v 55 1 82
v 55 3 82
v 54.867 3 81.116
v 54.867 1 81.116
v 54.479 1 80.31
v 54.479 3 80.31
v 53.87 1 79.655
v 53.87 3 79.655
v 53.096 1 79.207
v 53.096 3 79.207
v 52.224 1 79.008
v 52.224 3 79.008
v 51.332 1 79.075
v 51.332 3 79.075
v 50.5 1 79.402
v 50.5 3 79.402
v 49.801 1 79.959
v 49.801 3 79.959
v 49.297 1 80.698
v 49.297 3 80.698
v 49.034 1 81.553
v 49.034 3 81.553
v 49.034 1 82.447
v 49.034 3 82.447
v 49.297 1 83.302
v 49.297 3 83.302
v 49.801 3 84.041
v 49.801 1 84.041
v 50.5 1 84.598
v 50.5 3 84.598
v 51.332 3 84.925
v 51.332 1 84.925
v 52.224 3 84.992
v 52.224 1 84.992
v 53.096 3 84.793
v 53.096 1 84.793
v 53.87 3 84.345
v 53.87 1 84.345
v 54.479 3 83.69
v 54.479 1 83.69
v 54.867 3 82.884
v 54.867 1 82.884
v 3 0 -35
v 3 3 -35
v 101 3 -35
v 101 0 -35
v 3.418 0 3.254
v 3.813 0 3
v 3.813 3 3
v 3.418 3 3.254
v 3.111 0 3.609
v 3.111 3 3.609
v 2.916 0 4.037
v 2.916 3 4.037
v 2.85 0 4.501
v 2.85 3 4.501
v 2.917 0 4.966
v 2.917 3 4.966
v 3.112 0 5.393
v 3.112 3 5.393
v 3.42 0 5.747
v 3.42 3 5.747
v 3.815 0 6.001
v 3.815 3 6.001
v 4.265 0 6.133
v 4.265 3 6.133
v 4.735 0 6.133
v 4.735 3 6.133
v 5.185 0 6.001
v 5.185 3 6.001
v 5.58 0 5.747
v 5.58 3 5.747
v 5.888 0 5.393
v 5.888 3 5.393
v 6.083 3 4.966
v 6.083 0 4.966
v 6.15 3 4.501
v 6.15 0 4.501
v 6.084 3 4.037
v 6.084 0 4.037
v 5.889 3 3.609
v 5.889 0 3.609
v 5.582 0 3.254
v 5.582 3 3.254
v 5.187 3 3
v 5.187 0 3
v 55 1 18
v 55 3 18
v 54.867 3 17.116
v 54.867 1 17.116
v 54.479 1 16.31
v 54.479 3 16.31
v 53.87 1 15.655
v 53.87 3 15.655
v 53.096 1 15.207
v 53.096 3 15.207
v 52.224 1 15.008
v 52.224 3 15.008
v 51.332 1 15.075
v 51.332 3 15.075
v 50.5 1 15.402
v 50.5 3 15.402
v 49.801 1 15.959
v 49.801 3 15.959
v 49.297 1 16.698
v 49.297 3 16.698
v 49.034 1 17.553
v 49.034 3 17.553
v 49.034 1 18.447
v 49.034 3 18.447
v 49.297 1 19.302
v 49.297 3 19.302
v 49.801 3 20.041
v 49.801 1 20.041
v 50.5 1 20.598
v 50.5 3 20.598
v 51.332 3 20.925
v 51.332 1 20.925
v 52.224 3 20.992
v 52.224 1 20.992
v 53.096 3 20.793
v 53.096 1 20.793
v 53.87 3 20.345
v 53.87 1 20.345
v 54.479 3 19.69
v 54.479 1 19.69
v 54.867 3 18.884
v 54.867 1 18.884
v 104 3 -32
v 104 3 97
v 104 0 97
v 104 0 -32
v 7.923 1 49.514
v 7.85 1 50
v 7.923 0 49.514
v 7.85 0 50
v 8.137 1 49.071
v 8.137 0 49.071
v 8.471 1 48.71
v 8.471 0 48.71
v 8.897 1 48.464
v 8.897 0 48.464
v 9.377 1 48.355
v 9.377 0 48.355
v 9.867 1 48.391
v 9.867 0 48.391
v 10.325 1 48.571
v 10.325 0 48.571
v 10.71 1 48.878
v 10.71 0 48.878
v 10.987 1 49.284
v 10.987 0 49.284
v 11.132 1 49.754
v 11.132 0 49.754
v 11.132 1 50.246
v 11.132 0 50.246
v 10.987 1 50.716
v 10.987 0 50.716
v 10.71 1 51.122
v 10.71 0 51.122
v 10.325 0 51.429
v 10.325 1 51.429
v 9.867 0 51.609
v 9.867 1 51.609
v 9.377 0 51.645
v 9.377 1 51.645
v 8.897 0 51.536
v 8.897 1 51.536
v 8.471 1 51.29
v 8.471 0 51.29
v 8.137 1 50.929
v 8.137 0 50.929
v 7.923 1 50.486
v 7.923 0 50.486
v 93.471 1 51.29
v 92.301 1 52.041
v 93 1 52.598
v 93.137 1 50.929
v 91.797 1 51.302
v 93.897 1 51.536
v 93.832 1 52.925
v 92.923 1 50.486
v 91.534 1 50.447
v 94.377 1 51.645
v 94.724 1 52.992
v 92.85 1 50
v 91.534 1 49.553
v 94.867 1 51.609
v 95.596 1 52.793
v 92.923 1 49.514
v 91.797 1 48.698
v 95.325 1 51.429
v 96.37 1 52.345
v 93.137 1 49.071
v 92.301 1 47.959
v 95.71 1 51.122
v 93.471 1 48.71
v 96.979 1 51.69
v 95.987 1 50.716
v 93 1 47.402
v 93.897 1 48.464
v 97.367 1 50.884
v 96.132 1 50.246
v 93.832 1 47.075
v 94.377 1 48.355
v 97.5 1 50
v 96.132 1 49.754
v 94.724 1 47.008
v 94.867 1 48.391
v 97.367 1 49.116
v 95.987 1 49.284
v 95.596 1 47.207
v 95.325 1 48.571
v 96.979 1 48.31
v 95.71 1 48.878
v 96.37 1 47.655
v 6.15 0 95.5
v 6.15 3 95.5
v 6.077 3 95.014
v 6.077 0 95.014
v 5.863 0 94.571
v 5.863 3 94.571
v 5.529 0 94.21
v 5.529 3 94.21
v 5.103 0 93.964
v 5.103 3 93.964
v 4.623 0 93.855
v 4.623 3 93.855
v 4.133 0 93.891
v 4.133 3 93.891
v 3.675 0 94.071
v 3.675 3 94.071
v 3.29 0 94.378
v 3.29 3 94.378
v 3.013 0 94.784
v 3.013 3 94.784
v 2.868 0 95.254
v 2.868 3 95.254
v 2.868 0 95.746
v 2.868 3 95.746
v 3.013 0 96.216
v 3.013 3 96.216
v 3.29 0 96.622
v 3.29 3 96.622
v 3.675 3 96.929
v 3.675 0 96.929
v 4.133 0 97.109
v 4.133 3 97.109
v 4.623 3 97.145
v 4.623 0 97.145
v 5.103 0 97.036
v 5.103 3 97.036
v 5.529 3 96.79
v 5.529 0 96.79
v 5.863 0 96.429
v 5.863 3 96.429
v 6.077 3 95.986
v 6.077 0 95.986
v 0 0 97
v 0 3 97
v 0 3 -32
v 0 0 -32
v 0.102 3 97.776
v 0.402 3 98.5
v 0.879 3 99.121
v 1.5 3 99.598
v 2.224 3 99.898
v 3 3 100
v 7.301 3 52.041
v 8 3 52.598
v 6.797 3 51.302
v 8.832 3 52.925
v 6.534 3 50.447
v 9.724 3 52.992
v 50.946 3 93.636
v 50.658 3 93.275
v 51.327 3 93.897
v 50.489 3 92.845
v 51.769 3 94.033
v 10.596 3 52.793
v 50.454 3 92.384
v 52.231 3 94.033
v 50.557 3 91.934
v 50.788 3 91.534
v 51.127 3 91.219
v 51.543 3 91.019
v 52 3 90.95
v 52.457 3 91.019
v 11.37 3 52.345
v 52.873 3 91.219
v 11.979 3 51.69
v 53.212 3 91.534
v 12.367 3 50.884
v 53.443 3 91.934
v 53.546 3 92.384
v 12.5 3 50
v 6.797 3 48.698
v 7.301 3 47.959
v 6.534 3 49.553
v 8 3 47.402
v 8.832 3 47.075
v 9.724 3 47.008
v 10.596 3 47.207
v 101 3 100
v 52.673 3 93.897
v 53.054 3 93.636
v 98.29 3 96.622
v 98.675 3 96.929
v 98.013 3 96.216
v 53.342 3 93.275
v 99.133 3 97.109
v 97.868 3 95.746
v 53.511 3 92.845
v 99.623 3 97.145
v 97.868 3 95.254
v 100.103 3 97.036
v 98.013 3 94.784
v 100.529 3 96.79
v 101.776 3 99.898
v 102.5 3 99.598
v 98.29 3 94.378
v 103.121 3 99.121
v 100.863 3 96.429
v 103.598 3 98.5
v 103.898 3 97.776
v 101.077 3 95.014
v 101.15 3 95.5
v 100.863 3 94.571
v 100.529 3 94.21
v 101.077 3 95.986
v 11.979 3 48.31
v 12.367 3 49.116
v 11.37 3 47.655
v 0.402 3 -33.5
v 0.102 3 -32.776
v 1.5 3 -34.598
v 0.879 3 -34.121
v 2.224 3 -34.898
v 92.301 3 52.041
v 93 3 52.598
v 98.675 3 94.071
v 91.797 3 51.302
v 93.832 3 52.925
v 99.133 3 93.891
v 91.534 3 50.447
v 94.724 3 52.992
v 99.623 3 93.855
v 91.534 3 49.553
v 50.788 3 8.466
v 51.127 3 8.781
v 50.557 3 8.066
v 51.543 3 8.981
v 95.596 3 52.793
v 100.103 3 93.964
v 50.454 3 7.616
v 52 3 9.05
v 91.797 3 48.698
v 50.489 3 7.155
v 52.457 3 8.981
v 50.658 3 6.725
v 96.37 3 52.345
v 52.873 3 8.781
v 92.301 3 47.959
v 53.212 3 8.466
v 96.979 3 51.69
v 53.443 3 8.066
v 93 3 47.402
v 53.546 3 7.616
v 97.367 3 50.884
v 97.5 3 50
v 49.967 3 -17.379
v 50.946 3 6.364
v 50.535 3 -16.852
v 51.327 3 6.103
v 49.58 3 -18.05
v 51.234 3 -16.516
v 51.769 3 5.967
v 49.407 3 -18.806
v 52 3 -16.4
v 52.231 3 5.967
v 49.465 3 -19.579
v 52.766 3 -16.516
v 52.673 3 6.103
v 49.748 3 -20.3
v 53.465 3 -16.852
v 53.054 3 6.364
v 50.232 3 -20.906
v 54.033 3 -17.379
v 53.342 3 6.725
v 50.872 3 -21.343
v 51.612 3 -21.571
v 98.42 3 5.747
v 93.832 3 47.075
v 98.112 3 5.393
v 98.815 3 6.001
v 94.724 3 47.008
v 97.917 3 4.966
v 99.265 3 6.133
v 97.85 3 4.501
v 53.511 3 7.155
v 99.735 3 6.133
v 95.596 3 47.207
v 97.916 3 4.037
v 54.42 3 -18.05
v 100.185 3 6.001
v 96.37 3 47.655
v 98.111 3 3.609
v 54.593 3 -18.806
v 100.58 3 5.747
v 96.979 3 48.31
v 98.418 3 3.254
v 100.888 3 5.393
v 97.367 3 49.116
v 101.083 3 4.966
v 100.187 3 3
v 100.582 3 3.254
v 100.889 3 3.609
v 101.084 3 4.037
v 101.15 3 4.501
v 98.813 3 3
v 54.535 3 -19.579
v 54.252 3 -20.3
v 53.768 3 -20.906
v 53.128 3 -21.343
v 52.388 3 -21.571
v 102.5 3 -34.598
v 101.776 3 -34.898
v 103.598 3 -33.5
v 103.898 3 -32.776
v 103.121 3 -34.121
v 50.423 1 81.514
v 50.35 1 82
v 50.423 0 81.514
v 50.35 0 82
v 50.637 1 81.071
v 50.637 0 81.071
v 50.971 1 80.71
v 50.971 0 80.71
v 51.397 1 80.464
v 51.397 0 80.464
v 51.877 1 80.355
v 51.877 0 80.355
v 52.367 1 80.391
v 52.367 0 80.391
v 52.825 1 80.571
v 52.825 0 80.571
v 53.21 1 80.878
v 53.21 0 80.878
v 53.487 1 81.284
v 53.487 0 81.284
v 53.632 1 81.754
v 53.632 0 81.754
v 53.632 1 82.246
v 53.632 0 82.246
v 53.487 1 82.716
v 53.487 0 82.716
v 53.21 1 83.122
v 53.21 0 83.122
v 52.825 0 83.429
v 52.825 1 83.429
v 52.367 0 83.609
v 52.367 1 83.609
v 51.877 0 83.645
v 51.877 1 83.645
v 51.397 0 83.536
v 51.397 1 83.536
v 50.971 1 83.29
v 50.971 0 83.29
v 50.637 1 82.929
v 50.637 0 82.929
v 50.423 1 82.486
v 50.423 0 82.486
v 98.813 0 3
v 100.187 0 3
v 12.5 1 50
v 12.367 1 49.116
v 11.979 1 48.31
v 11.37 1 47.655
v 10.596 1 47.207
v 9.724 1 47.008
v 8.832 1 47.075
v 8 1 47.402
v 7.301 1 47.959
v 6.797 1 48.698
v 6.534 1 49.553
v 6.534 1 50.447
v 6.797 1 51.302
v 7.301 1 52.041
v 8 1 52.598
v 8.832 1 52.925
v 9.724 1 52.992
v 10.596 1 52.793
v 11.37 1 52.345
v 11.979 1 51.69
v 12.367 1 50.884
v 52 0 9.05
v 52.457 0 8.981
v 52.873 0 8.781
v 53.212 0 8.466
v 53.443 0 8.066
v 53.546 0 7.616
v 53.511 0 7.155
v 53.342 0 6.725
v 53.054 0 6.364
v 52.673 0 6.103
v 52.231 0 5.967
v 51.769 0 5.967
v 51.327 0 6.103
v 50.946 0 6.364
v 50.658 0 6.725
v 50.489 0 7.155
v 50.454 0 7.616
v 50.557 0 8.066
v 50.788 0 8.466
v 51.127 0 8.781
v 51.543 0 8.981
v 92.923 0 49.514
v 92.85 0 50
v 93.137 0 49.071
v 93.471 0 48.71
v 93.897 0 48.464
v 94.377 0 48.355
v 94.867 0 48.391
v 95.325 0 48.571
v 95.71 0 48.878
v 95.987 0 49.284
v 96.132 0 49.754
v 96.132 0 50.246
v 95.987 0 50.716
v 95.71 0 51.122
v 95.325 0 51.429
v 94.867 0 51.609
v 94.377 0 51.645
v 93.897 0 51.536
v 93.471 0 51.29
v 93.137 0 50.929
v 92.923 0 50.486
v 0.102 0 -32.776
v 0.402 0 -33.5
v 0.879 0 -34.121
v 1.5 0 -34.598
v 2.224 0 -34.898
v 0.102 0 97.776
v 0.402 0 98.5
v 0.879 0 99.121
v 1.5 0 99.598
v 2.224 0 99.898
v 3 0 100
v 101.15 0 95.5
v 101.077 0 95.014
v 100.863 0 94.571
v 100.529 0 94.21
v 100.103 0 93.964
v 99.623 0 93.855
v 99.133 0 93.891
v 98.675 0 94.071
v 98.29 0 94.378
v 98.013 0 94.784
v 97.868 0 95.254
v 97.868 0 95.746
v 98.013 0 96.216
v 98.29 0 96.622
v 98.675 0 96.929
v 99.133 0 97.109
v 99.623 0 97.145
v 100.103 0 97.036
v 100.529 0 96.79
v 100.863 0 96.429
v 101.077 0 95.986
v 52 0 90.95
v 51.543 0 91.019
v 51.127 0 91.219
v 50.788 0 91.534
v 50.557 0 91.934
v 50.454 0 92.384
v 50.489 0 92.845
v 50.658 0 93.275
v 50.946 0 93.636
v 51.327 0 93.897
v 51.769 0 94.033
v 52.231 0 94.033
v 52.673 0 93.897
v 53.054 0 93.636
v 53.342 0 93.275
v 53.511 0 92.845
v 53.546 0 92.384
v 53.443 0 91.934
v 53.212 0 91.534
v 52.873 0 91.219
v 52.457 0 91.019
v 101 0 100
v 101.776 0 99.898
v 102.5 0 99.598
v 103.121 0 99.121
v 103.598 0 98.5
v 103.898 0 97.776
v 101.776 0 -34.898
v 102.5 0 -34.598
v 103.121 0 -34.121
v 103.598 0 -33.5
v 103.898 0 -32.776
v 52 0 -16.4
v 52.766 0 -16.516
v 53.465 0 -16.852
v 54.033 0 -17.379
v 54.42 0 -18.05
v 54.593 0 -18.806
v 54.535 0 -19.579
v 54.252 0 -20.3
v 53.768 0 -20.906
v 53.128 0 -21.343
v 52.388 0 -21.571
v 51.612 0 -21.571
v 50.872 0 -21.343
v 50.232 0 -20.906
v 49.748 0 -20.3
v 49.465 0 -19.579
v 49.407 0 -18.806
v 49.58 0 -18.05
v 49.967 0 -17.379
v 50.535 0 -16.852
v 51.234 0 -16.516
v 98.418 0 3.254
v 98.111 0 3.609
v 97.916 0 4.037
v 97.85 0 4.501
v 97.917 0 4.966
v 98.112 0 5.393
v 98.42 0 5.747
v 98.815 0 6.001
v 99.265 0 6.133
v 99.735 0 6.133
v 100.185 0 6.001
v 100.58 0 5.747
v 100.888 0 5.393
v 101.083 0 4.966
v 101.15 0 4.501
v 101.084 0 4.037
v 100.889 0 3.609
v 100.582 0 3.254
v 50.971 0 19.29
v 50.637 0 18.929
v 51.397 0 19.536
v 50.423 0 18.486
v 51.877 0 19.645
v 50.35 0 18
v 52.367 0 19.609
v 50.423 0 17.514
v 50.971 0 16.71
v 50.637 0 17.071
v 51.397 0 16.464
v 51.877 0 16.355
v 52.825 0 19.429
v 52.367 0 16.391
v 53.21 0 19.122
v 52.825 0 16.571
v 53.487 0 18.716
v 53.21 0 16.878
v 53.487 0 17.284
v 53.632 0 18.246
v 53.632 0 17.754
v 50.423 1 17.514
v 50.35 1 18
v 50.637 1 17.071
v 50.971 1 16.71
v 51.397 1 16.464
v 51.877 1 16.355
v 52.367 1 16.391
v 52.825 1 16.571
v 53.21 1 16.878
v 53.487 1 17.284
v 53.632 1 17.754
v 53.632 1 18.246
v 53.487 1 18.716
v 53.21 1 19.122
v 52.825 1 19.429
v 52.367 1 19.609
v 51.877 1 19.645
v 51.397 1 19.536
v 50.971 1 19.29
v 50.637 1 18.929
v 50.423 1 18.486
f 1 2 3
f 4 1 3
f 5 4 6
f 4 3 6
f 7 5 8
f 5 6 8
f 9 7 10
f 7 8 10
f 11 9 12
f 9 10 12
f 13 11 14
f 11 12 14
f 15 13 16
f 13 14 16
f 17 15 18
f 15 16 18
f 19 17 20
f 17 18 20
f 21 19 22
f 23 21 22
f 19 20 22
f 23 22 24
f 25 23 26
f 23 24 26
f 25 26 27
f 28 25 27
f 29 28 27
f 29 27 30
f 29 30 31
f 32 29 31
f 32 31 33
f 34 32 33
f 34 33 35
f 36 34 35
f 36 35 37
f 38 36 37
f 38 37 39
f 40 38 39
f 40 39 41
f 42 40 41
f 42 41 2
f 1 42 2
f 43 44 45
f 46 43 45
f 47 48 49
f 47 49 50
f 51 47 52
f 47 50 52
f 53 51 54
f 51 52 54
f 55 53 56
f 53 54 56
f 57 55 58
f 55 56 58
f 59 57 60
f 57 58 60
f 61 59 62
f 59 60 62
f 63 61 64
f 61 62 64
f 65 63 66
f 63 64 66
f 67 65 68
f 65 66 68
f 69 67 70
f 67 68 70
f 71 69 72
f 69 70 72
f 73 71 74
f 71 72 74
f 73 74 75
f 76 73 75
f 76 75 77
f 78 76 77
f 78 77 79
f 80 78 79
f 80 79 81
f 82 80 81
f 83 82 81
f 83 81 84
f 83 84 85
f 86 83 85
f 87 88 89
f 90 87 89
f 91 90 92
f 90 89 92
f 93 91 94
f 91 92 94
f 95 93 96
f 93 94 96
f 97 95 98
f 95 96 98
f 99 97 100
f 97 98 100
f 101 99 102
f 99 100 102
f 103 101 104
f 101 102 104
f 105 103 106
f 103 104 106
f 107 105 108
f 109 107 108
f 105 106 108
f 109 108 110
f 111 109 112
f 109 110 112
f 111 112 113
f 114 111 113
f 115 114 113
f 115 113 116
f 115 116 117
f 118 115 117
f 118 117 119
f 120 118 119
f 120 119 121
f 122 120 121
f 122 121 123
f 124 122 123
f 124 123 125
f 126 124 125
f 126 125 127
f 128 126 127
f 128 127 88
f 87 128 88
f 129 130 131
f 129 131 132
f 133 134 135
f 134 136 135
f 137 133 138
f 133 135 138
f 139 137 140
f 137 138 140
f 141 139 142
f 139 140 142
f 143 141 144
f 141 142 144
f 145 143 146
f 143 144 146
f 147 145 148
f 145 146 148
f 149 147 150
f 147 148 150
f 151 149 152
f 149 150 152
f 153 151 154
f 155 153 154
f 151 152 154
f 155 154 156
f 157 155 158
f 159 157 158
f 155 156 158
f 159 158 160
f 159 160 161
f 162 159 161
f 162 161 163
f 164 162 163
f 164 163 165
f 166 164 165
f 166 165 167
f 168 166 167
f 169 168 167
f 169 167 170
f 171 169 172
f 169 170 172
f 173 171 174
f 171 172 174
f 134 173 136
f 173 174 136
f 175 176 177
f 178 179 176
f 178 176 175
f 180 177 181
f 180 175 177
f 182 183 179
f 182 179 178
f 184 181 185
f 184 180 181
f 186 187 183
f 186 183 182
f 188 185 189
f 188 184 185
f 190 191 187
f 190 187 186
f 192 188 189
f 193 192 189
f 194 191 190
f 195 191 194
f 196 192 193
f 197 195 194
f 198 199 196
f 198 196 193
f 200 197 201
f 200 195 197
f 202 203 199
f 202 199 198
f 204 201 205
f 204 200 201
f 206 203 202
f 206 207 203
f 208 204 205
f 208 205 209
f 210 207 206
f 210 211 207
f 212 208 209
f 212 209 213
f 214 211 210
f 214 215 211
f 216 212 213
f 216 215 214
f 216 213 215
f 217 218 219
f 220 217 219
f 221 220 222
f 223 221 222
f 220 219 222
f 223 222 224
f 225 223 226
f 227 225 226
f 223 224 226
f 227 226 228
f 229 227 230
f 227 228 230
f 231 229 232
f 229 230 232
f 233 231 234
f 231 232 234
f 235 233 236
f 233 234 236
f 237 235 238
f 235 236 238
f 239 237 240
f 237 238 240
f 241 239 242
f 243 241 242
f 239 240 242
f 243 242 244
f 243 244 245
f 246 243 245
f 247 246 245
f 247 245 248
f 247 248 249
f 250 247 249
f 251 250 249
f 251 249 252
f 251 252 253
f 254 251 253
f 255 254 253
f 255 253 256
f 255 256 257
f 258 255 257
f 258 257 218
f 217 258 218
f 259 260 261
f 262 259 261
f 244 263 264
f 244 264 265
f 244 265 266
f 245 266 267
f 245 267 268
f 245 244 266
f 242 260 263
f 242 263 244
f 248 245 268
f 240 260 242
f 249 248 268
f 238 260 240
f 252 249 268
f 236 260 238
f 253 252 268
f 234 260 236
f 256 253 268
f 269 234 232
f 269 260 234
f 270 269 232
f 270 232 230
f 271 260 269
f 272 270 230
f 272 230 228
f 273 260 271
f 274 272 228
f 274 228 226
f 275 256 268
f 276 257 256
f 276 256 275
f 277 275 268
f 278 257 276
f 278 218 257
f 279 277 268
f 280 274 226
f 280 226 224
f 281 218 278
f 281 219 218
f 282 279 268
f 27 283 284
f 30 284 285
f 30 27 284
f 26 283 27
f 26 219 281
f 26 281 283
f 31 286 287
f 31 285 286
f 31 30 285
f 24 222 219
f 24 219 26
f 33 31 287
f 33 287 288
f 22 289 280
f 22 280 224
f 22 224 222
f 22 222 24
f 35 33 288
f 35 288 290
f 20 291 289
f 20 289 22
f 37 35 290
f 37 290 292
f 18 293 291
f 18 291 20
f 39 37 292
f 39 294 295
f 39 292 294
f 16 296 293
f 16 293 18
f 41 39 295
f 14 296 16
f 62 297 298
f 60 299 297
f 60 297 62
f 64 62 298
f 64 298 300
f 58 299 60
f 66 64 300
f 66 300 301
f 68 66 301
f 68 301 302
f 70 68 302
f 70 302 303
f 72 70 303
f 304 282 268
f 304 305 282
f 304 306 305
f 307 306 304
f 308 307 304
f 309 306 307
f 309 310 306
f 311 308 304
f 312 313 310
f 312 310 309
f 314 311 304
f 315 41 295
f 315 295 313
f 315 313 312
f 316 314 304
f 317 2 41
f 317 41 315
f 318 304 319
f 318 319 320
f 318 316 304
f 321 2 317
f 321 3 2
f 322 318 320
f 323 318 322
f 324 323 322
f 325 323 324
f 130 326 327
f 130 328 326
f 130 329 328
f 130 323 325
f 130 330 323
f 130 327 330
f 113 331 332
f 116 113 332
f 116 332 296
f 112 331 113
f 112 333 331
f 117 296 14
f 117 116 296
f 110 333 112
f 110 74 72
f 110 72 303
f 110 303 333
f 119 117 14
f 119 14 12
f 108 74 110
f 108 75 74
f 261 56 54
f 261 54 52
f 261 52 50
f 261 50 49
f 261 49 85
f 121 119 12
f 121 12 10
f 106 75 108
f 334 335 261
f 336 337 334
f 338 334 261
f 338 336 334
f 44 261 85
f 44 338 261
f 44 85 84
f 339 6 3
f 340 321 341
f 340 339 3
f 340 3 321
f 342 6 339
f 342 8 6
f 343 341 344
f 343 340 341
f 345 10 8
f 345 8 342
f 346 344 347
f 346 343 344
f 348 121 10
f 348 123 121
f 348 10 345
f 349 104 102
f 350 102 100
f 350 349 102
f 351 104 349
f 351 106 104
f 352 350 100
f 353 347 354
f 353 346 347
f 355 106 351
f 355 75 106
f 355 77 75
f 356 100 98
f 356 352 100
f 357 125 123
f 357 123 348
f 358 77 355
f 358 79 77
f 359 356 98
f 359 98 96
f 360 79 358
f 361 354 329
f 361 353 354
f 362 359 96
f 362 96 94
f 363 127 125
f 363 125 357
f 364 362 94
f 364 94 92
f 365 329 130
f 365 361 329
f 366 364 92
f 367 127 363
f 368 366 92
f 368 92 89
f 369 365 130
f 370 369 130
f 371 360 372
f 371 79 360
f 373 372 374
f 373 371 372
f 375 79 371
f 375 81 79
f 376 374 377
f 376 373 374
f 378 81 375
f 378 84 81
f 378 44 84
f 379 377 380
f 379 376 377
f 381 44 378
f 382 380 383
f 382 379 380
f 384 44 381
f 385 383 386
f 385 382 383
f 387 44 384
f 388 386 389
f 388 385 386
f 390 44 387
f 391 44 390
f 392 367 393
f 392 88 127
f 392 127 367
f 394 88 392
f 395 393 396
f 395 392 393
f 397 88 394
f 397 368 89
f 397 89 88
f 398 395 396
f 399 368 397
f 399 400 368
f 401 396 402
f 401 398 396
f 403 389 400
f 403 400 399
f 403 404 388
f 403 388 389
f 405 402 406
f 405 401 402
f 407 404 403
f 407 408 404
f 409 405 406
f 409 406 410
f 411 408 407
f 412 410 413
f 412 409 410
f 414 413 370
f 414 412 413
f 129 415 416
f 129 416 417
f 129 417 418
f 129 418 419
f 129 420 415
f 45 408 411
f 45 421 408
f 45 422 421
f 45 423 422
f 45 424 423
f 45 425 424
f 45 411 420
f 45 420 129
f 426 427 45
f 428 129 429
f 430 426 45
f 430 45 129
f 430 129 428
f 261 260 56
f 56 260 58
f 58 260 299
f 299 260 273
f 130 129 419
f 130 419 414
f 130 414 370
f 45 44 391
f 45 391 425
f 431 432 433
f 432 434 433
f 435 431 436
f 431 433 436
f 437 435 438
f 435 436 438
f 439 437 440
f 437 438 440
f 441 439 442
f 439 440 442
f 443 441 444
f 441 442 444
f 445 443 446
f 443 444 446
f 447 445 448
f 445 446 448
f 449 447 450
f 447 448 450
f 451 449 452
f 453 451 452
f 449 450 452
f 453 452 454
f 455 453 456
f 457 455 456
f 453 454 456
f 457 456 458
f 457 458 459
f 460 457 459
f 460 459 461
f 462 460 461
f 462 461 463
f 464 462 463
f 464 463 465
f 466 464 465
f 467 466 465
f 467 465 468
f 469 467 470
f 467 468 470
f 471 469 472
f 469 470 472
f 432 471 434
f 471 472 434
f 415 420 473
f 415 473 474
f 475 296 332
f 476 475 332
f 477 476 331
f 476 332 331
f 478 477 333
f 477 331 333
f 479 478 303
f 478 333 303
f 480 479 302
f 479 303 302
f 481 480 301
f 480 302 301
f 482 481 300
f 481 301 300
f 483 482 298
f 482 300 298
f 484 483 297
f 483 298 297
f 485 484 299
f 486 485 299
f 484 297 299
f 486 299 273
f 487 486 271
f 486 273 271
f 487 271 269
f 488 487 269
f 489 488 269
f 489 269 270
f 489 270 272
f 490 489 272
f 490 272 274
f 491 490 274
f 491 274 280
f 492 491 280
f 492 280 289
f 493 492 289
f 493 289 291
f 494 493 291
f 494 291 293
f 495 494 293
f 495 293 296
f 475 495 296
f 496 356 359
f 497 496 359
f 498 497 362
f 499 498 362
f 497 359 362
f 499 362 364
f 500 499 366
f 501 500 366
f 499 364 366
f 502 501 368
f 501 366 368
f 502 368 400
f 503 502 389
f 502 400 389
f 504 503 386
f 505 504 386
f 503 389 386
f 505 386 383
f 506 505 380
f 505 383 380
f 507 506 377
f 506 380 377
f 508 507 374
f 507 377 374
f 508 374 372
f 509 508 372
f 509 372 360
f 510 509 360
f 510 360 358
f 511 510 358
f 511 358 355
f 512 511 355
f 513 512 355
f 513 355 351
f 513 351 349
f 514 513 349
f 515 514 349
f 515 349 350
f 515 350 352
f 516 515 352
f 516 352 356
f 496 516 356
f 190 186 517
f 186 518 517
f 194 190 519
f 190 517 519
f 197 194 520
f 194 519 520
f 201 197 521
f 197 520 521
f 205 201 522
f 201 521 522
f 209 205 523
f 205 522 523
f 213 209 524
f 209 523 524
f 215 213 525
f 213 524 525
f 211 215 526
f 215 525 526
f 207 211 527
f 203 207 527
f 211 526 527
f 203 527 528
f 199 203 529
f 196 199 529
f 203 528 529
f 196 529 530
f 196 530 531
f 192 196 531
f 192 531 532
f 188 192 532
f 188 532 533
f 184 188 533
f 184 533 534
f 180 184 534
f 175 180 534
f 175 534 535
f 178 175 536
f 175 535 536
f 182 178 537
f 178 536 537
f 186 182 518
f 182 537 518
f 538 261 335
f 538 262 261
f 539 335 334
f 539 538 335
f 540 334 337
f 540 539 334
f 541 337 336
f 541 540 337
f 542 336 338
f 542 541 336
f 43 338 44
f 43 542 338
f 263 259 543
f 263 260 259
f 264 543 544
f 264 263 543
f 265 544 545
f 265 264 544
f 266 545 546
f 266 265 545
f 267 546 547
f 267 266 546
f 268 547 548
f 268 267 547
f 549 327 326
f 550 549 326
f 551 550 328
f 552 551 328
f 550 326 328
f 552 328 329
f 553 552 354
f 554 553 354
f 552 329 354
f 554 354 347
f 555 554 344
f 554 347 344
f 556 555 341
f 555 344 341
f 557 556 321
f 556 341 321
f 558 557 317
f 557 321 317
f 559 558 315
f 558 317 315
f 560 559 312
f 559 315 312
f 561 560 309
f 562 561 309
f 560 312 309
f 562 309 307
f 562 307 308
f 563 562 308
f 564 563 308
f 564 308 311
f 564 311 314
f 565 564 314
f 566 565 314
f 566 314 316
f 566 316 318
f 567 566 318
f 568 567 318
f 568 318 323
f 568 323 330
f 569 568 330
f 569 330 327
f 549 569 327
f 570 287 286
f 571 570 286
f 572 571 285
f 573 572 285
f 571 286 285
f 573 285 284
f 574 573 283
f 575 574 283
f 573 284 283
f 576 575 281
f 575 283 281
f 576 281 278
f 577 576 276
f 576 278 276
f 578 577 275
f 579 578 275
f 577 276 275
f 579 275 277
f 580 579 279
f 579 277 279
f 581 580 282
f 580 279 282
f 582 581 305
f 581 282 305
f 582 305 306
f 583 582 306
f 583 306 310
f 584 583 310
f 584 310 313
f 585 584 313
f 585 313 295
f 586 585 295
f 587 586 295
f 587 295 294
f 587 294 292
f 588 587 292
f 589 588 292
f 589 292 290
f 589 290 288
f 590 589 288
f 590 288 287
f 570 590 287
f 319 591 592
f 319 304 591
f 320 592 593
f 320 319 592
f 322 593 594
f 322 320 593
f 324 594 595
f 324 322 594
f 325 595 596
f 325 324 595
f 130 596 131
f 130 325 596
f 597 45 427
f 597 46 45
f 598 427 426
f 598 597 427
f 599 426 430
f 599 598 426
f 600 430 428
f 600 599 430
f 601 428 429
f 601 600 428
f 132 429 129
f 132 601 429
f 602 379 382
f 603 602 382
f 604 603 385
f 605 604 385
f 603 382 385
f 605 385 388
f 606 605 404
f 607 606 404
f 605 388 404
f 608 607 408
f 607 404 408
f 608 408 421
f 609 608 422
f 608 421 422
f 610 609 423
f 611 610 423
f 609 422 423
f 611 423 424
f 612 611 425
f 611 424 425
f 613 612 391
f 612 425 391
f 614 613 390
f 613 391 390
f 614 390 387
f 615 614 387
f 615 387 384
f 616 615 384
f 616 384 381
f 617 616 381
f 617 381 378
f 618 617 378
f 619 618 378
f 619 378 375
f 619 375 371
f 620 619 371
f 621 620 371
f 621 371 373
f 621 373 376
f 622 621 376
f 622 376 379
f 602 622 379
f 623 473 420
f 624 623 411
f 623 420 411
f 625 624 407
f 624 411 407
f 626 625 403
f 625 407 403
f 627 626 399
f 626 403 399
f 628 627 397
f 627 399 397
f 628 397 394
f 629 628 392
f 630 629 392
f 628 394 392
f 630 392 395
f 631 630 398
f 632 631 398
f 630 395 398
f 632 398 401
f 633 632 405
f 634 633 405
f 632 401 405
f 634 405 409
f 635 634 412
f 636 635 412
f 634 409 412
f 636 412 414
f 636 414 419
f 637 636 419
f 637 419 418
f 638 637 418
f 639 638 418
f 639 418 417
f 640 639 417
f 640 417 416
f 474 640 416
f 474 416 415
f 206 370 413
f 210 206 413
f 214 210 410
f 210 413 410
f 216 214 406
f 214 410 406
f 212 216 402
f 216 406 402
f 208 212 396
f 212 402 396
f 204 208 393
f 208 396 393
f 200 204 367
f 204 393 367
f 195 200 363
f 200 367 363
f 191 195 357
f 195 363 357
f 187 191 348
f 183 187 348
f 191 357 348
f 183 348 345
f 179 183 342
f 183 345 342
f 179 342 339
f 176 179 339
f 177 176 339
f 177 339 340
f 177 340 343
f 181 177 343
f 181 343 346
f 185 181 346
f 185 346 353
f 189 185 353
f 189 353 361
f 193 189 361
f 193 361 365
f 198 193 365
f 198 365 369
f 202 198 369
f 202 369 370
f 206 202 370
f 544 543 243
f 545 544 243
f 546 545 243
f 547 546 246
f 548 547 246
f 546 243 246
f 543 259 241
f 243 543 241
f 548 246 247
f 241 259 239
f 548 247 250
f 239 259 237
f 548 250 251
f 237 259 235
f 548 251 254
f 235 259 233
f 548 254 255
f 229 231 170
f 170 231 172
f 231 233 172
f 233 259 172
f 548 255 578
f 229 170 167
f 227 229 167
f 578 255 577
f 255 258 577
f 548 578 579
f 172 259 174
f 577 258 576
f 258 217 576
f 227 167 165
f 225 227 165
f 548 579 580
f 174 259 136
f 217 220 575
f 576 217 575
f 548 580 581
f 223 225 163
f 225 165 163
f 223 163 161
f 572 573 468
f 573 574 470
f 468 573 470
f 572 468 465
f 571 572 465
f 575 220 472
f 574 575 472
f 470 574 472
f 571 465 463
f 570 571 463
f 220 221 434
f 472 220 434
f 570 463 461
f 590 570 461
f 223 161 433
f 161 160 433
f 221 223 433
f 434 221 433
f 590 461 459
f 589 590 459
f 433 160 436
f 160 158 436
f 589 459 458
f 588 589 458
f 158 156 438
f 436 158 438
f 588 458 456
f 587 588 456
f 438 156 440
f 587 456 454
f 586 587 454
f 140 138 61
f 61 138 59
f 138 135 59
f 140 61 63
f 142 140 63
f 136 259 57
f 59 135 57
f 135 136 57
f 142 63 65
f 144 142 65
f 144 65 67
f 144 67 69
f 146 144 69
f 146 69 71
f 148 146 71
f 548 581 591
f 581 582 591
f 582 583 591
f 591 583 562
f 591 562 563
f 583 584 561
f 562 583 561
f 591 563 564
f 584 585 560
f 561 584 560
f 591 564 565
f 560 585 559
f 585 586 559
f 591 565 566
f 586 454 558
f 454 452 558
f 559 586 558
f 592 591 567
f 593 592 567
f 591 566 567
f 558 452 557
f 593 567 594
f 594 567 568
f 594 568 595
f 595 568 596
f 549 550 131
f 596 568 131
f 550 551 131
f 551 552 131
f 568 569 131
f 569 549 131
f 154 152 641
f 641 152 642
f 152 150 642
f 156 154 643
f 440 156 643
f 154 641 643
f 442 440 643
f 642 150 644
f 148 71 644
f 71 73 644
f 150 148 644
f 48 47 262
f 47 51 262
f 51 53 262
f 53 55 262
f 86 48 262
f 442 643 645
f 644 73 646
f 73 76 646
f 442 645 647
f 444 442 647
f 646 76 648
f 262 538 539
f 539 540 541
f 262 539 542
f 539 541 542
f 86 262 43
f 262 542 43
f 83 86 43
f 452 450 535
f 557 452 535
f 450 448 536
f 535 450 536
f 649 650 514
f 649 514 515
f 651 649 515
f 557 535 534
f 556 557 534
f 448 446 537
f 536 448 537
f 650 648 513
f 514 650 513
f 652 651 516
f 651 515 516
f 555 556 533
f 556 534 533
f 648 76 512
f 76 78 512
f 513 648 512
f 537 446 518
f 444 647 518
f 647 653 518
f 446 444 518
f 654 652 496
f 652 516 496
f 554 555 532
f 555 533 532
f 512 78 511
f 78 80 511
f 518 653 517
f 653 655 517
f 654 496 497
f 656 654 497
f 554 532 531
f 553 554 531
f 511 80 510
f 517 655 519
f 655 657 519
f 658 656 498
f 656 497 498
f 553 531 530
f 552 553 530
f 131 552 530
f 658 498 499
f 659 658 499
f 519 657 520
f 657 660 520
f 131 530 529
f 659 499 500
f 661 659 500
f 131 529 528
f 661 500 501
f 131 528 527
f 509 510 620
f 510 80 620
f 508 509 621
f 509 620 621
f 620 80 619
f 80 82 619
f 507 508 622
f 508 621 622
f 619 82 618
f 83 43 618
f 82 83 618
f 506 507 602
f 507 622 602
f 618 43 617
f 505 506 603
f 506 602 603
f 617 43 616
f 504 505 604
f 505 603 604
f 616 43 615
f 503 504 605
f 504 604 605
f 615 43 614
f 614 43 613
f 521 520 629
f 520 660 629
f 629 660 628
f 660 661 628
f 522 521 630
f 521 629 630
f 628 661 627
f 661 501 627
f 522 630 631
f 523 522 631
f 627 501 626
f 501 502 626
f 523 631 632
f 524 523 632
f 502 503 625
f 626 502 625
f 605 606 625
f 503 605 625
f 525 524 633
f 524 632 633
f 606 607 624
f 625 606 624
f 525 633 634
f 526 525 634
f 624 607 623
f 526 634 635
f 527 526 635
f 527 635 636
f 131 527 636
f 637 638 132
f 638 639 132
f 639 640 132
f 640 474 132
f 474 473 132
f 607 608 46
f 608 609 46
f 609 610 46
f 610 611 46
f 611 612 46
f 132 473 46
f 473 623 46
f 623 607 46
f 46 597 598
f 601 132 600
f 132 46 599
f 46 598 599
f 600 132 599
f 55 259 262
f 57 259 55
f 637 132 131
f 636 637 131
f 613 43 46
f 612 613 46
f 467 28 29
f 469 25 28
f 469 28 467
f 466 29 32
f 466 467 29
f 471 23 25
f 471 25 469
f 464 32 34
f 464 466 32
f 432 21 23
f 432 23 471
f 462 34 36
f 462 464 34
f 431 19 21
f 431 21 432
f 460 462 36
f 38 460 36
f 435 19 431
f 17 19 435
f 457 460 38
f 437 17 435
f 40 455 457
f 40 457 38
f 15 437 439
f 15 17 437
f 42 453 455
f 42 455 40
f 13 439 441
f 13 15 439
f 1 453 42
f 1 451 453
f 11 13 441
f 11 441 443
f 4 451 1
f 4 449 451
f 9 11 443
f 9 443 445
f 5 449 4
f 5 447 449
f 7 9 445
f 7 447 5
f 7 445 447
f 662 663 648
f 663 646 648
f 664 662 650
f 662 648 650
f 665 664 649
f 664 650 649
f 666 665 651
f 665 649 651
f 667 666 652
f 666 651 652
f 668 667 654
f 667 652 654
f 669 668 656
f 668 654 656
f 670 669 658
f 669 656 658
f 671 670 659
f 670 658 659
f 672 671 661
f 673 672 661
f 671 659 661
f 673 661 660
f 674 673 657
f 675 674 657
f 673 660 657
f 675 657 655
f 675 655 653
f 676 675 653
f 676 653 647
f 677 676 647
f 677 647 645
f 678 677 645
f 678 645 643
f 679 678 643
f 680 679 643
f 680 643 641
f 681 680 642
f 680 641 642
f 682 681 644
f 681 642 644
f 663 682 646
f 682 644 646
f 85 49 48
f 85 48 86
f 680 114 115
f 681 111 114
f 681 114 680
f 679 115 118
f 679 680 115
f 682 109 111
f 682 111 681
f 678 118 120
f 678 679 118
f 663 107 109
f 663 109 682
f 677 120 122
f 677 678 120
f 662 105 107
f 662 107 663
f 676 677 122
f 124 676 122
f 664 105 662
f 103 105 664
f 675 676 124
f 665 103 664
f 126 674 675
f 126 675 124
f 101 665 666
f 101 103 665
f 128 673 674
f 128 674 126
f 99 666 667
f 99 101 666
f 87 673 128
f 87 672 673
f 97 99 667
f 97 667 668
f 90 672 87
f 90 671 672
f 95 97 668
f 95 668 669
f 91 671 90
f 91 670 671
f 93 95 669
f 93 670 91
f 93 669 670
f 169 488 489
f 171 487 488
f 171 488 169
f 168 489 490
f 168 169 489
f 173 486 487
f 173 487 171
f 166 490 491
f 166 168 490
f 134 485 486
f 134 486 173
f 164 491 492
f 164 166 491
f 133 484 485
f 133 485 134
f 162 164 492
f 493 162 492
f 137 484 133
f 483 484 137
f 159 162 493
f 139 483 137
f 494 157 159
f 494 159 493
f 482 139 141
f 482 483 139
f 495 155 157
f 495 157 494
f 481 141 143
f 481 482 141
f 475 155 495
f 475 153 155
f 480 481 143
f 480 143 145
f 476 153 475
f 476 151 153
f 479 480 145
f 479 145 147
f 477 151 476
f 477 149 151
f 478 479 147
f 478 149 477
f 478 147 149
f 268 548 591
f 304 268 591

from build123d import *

# Parameters (mm, degrees)
SKETCH_1_W                   = 104
SKETCH_1_H                   = 100
EXTRUDE_1_DEPTH              = 3
HOLE_WIZARD_3_3_3_3_1_D      = 3.3
HOLE_WIZARD_M3_1_D           = 3.3
HOLE_WIZARD_M3_1_CBORE_D     = 6
HOLE_WIZARD_M3_1_CBORE_DEPTH = 2
FILLET_1_R                   = 3
SKETCH_49_R                  = 1.55
CUT_EXTRUDE_44_DEPTH         = 145.308696897
SKETCH_50_W                  = 104
SKETCH_50_H                  = 38
EXTRUDE_2_DEPTH              = 3
SKETCH_51_R                  = 2.6
CUT_EXTRUDE_45_DEPTH         = 145.308696897
FILLET_2_R                   = 3


with BuildPart() as part:
    # 草图1 → 凸台-拉伸1 (new body)
    with BuildSketch(Plane.XZ):
        with Locations((52, 50)):
            Rectangle(SKETCH_1_W, SKETCH_1_H)
    extrude(amount=-EXTRUDE_1_DEPTH)

    # Ø3.3 (3.3) 直径孔1 (through all)
    with Locations(Plane(origin=(0, 0, 0), x_dir=(-1, 0, 0), z_dir=(0, -1, 0))):
        with Locations((-4.5, -4.5), (-99.5, -4.5), (-99.5, -95.5), (-4.5, -95.5)):
            Hole(HOLE_WIZARD_3_3_3_3_1_D / 2)

    # M3 六角头机械螺钉的柱形沉头孔1 (through all)
    with Locations(Plane(origin=(0, 3, 0), x_dir=(1, 0, 0), z_dir=(0, 1, 0))):
        with Locations((52, -18), (94.5, -50), (9.5, -50), (52, -82)):
            CounterBoreHole(HOLE_WIZARD_M3_1_D / 2, HOLE_WIZARD_M3_1_CBORE_D / 2, HOLE_WIZARD_M3_1_CBORE_DEPTH)

    # 圆角1
    fillet_1_edges = [part.edges().sort_by_distance(p)[0] for p in [
        (0, 1.5, 100),
        (104, 1.5, 100),
        (104, 1.5, 0),
        (0, 1.5, 0),
    ]]
    fillet(fillet_1_edges, radius=FILLET_1_R)

    # 草图49 → 切除-拉伸44 (cut, through all)
    with BuildSketch(Plane(origin=(0, 3, 0), x_dir=(1, 0, 0), z_dir=(0, 1, 0))):
        with Locations(Location((52, -7.5, 0), (0, 0, 270))):
            Circle(SKETCH_49_R)
        with Locations(Location((52, -92.5, 0), (0, 0, 90))):
            Circle(SKETCH_49_R)
    extrude(amount=-CUT_EXTRUDE_44_DEPTH, mode=Mode.SUBTRACT)

    # 草图50 → 凸台-拉伸2 (add)
    with BuildSketch(Plane(origin=(0, 3, 0), x_dir=(1, 0, 0), z_dir=(0, 1, 0))):
        with Locations((52, 16)):
            Rectangle(SKETCH_50_W, SKETCH_50_H)
    extrude(amount=-EXTRUDE_2_DEPTH)

    # 草图51 → 切除-拉伸45 (cut, through all)
    with BuildSketch(Plane(origin=(0, 3, 0), x_dir=(1, 0, 0), z_dir=(0, 1, 0))):
        with Locations(Location((52, 19, 0), (0, 0, 270))):
            Circle(SKETCH_51_R)
    extrude(amount=-CUT_EXTRUDE_45_DEPTH, mode=Mode.SUBTRACT)

    # 圆角2
    fillet_2_edges = [part.edges().sort_by_distance(p)[0] for p in [
        (104, 1.5, -35),
        (0, 1.5, -35),
    ]]
    fillet(fillet_2_edges, radius=FILLET_2_R)


solid = part.part
